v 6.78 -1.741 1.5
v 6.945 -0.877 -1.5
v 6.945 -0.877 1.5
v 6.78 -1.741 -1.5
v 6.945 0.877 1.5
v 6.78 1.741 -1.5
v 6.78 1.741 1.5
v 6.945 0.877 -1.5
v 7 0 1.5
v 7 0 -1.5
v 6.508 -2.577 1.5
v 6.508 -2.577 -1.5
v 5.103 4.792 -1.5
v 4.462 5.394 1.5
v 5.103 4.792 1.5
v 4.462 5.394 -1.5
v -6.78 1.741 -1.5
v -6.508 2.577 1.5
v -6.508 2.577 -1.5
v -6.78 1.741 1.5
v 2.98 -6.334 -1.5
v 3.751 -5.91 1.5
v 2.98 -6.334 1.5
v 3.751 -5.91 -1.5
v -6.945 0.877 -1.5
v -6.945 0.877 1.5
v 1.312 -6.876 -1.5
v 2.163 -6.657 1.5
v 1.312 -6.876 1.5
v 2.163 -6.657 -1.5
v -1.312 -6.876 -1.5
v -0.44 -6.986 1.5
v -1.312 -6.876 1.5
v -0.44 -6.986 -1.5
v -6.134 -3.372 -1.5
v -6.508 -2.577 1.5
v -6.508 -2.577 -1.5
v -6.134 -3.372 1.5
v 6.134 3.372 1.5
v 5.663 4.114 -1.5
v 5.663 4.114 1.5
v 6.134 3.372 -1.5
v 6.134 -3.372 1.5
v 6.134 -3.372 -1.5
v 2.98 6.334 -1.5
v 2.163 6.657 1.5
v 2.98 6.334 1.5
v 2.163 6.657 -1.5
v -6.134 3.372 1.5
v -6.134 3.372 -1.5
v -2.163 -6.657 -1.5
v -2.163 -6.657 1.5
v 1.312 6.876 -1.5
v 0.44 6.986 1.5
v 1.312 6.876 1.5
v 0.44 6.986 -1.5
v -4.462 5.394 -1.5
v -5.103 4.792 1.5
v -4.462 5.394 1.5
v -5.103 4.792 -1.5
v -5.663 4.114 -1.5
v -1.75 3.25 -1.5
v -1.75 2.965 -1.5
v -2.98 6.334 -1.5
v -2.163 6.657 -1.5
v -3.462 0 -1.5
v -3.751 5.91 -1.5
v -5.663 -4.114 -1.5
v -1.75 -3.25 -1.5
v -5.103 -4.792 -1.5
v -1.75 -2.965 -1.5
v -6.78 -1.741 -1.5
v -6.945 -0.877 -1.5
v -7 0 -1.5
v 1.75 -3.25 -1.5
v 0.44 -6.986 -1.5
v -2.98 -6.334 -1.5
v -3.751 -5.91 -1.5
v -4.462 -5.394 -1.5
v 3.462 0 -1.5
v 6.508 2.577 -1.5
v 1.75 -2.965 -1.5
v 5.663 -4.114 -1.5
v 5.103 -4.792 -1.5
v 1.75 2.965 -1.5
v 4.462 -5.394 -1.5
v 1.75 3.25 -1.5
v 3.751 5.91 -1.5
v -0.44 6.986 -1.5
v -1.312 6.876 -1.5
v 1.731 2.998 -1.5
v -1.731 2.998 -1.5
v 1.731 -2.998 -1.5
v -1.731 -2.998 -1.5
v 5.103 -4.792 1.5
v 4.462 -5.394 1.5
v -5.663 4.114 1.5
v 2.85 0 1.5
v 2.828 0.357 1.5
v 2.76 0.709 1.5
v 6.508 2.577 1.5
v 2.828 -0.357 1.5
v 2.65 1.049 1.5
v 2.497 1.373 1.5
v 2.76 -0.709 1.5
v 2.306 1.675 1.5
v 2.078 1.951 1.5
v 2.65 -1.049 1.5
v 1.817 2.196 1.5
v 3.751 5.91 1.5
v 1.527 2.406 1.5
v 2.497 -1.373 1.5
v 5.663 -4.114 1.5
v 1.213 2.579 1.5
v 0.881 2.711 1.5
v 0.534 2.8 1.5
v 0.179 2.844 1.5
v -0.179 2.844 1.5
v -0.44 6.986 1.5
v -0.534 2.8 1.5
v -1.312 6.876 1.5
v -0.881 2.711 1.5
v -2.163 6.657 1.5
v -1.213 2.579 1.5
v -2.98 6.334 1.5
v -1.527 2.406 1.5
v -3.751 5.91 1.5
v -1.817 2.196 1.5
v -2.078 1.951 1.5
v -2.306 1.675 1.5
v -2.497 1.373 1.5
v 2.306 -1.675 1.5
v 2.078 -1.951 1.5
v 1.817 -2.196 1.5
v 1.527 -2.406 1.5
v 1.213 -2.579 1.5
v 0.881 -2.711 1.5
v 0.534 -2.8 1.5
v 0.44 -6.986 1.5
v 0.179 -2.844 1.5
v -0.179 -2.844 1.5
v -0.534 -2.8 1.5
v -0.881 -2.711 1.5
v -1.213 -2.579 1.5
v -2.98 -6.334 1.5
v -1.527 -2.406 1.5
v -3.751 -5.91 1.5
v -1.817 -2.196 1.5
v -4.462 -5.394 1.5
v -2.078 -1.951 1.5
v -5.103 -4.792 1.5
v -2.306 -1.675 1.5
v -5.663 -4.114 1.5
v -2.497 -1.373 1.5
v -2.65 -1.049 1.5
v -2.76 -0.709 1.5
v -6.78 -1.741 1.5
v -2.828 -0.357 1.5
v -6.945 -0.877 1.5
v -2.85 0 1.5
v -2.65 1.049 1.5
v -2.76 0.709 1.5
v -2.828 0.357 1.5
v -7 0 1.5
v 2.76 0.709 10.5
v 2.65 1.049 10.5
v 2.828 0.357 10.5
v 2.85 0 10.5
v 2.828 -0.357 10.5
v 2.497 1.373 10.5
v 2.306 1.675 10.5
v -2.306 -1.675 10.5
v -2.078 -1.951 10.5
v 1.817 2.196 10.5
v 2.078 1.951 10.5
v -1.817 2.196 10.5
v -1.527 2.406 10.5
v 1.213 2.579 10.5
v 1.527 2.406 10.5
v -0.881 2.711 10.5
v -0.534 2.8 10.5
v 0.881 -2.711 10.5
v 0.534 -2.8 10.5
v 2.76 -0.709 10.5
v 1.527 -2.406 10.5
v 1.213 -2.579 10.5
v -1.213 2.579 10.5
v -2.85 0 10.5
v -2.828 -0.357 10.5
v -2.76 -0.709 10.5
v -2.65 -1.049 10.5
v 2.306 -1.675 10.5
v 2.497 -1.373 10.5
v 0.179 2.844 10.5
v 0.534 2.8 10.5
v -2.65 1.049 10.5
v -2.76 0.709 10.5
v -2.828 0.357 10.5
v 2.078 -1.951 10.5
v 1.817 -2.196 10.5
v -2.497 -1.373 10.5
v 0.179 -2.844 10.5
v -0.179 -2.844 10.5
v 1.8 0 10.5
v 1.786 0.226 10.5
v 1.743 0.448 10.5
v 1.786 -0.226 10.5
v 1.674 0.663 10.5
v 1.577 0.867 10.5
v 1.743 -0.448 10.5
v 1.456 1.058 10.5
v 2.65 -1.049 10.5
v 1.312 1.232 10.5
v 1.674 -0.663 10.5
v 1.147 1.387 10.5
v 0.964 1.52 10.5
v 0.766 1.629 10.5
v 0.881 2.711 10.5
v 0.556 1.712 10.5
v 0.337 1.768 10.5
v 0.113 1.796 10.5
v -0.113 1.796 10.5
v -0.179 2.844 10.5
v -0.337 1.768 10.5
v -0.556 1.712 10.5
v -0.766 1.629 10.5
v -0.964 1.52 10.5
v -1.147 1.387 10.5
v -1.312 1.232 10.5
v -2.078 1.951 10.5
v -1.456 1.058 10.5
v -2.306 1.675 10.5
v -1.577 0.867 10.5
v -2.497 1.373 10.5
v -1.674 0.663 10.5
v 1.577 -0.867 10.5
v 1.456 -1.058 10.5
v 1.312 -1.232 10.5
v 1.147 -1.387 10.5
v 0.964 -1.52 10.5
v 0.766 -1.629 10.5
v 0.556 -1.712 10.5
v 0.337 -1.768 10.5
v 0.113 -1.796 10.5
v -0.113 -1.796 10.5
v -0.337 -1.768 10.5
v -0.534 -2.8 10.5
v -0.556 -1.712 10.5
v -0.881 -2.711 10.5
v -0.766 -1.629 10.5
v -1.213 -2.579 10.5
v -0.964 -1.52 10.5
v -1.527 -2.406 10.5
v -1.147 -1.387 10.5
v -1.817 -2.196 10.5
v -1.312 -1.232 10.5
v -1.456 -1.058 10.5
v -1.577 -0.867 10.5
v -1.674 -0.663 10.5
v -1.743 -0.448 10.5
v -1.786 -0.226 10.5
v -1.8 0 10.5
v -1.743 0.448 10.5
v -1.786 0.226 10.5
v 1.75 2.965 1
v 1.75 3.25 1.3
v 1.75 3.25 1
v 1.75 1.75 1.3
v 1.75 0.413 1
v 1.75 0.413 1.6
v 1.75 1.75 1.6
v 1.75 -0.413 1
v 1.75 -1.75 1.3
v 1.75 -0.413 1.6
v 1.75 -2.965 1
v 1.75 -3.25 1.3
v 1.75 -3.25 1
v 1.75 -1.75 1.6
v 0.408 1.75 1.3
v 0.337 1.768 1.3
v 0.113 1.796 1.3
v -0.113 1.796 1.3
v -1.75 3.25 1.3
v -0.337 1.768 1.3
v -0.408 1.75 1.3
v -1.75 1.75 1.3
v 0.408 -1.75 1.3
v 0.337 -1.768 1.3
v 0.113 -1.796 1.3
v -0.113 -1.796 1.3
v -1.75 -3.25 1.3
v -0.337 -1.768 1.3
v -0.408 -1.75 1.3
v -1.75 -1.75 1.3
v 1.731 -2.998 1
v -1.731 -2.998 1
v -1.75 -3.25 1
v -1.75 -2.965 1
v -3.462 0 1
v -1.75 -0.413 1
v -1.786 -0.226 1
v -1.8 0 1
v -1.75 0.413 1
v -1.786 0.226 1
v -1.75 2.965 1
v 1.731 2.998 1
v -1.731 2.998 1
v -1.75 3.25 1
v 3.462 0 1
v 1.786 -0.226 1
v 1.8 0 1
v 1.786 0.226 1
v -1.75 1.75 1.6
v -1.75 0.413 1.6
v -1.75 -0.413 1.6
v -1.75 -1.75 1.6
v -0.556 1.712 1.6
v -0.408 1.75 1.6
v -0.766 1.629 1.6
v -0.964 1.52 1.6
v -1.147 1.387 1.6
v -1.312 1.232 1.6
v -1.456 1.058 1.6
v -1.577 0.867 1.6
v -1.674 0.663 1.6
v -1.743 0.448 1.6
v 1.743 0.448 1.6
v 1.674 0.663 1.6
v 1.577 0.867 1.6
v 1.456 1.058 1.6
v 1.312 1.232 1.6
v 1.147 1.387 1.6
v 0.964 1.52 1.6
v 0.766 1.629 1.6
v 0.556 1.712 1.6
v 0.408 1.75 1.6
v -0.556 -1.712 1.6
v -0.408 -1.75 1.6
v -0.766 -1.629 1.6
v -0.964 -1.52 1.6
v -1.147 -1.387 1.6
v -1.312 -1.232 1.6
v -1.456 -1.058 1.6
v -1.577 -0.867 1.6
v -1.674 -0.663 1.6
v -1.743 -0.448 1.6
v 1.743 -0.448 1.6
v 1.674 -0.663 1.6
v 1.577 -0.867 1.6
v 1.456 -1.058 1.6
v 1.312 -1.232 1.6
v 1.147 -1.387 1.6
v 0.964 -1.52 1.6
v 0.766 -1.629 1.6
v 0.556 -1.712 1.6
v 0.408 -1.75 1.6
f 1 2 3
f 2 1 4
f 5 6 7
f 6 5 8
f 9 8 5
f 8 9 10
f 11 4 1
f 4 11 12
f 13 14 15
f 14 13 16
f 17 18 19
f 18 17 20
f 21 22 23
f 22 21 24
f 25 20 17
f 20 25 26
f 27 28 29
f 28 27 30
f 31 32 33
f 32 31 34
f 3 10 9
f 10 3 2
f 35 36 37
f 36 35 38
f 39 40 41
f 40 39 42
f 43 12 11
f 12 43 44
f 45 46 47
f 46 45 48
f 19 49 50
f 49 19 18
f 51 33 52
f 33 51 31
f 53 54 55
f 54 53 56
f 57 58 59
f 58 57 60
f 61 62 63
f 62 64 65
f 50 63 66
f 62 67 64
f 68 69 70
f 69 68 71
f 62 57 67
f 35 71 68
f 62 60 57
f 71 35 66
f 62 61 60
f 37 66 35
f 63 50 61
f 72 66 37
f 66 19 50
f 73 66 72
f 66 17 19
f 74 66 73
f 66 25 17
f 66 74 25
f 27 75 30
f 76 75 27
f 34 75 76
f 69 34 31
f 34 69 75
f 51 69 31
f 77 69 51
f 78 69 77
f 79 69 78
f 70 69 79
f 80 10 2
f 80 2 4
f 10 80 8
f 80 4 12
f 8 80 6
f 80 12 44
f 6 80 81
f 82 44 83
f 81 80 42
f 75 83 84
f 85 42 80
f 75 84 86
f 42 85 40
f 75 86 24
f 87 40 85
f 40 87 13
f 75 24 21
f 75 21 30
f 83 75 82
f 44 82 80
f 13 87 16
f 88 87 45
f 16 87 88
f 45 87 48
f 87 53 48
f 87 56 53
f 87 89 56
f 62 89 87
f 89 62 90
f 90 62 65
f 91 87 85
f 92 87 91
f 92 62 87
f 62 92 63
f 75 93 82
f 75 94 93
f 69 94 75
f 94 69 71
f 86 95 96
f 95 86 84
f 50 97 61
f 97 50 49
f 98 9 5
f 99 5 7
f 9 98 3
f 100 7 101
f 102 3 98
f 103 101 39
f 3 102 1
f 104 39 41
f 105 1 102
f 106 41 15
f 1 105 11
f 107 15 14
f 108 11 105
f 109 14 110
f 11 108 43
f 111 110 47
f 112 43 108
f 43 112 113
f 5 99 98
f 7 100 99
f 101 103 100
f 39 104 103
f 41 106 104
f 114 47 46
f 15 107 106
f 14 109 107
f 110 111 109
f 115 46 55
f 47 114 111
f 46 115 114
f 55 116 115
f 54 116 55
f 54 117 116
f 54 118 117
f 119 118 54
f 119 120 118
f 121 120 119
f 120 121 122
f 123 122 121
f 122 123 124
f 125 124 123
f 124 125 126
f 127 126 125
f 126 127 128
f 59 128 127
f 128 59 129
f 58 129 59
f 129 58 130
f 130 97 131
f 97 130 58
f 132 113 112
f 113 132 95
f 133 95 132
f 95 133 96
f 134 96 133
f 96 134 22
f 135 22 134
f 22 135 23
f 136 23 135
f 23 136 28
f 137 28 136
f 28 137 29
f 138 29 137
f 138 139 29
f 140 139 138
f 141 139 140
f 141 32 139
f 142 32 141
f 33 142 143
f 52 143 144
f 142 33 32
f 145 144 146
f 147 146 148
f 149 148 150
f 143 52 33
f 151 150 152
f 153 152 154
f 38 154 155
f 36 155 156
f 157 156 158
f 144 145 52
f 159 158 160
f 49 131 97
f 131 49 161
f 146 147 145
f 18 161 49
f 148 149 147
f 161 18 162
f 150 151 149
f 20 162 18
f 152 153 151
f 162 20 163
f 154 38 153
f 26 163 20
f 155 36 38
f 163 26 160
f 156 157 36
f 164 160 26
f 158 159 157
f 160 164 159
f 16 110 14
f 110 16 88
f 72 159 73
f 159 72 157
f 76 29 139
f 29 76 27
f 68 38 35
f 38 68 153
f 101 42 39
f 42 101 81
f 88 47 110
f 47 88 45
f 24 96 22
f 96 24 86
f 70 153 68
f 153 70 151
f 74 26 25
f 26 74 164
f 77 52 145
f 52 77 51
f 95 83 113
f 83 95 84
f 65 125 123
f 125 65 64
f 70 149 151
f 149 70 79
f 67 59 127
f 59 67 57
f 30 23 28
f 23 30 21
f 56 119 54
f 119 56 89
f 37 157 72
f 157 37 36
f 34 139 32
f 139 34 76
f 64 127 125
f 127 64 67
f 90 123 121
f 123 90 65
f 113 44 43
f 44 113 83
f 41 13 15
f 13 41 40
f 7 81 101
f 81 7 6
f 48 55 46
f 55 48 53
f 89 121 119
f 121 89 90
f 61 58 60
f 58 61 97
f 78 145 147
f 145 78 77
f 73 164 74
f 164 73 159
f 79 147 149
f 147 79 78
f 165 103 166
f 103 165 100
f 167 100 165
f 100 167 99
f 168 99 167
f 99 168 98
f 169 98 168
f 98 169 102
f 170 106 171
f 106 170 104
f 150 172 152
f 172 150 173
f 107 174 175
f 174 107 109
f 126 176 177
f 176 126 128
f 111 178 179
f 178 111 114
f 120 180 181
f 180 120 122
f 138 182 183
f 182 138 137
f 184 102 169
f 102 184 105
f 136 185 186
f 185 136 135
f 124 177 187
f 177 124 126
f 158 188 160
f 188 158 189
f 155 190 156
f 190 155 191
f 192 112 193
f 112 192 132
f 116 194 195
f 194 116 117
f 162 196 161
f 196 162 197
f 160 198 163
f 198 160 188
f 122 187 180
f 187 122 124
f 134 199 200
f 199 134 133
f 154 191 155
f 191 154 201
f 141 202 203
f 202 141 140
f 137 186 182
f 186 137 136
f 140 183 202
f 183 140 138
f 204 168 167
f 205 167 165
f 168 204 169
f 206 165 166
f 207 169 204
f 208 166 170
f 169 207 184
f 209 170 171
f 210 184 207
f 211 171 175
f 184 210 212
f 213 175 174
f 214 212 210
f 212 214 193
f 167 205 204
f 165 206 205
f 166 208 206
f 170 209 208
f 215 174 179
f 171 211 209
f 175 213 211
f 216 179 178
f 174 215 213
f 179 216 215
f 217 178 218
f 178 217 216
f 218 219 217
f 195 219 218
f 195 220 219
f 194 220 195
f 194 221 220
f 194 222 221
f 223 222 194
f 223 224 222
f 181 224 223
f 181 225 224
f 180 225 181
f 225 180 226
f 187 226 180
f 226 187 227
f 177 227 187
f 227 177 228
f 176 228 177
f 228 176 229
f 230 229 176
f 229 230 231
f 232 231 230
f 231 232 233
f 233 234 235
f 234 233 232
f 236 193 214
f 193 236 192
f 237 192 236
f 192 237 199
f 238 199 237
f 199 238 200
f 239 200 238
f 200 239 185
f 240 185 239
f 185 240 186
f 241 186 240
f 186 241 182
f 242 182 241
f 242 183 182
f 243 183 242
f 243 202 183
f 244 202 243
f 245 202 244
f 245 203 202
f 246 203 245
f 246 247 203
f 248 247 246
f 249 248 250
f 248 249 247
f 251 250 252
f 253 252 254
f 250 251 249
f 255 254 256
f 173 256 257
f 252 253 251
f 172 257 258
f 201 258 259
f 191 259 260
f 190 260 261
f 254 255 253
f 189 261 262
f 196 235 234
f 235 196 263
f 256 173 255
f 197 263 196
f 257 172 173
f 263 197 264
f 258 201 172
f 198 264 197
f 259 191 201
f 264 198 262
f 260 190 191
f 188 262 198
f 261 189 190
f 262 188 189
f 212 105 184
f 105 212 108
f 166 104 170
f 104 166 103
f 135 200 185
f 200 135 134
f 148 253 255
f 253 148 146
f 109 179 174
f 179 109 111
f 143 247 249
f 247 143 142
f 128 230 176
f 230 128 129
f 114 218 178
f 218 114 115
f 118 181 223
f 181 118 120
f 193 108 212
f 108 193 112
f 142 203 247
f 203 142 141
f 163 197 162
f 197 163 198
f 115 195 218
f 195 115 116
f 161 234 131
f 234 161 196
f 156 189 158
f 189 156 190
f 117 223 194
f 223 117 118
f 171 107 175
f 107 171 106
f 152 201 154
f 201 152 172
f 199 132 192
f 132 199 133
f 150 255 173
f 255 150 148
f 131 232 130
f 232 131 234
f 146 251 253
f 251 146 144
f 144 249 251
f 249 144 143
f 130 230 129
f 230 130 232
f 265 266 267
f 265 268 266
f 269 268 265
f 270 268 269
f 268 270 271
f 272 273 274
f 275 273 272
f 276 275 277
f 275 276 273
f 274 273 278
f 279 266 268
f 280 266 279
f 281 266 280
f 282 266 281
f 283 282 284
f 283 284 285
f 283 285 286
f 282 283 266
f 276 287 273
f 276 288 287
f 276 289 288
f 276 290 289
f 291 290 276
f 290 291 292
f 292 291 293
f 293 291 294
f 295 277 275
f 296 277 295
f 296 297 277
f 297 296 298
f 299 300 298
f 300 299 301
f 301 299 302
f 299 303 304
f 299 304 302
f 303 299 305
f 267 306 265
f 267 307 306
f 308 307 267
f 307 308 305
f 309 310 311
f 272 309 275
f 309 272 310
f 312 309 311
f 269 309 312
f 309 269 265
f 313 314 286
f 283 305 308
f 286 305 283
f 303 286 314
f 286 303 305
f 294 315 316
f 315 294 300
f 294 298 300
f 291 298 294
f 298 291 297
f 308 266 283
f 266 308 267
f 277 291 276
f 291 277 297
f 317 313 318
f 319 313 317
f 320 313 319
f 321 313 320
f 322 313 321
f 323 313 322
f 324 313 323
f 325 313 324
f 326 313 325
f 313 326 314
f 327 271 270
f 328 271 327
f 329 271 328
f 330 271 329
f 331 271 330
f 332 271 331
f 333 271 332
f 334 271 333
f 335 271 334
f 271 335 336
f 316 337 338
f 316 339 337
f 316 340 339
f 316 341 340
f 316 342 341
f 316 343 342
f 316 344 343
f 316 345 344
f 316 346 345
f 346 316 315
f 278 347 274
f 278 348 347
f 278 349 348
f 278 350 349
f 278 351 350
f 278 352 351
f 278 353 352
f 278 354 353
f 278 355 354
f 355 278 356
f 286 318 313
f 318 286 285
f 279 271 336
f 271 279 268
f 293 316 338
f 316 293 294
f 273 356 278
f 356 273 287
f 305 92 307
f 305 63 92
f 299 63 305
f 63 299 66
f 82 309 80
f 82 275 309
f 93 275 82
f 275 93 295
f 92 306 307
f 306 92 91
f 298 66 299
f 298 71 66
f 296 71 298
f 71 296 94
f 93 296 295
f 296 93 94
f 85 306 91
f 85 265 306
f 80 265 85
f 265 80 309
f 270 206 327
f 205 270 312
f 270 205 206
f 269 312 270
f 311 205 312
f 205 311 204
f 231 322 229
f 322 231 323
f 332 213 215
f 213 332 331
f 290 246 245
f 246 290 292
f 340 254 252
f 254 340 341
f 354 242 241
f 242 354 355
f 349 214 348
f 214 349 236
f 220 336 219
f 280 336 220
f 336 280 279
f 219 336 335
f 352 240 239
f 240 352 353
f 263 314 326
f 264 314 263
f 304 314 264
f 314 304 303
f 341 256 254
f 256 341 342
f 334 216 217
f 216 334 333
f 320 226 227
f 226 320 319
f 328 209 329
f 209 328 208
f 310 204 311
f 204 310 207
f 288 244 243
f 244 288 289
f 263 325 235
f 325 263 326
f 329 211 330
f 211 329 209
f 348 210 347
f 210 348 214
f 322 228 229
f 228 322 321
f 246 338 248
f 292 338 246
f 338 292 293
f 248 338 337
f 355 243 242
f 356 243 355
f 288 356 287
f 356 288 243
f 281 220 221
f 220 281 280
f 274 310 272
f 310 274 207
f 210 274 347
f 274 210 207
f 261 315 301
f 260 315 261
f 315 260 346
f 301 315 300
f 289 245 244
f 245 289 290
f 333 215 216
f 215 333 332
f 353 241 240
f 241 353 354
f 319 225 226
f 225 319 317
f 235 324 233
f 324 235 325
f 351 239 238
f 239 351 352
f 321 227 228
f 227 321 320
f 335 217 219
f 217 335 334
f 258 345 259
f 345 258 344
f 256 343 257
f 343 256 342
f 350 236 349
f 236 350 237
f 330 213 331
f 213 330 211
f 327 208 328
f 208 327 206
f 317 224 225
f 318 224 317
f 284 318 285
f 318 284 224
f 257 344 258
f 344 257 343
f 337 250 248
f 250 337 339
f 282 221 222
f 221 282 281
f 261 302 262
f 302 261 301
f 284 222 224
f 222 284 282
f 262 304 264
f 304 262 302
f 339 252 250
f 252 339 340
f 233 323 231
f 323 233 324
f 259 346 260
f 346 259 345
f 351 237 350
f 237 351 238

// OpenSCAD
$fn = 50;


difference() {
	union() {
		translate(v = [0, 0, -1.5000000000]) {
			cylinder(h = 3, r = 7.0000000000);
		}
		translate(v = [0, 0, -1.5000000000]) {
			cylinder(h = 12, r = 2.8500000000);
		}
	}
	union() {
		translate(v = [0, 0, -1.5000000000]) {
			rotate(a = [0, 0, 0]) {
				difference() {
					union() {
						translate(v = [-1.7500000000, -3.2500000000, -0.3000000000]) {
							cube(size = [3.5000000000, 6.5000000000, 0.3000000000]);
						}
						translate(v = [-1.7500000000, -1.7500000000, -0.6000000000]) {
							cube(size = [3.5000000000, 3.5000000000, 0.3000000000]);
						}
						translate(v = [-1.7500000000, -3.2500000000, 2.5000000000]) {
							cube(size = [3.5000000000, 6.5000000000, 0.3000000000]);
						}
						translate(v = [-1.7500000000, -1.7500000000, 2.8000000000]) {
							cube(size = [3.5000000000, 3.5000000000, 0.3000000000]);
						}
						linear_extrude(height = 2.5000000000) {
							polygon(points = [[3.4620000000, 0.0000000000], [1.7310000000, 2.9981799479], [-1.7310000000, 2.9981799479], [-3.4620000000, 0.0000000000], [-1.7310000000, -2.9981799479], [1.7310000000, -2.9981799479]]);
						}
						translate(v = [-1.7500000000, -3.2500000000, -0.3000000000]) {
							cube(size = [3.5000000000, 6.5000000000, 0.3000000000]);
						}
						translate(v = [-1.7500000000, -1.7500000000, -0.6000000000]) {
							cube(size = [3.5000000000, 3.5000000000, 0.3000000000]);
						}
						translate(v = [-1.7500000000, -3.2500000000, 2.5000000000]) {
							cube(size = [3.5000000000, 6.5000000000, 0.3000000000]);
						}
						translate(v = [-1.7500000000, -1.7500000000, 2.8000000000]) {
							cube(size = [3.5000000000, 3.5000000000, 0.3000000000]);
						}
						translate(v = [-1.7500000000, -3.2500000000, -0.3000000000]) {
							cube(size = [3.5000000000, 6.5000000000, 0.3000000000]);
						}
						translate(v = [-1.7500000000, -1.7500000000, -0.6000000000]) {
							cube(size = [3.5000000000, 3.5000000000, 0.3000000000]);
						}
						translate(v = [-1.7500000000, -3.2500000000, 2.5000000000]) {
							cube(size = [3.5000000000, 6.5000000000, 0.3000000000]);
						}
						translate(v = [-1.7500000000, -1.7500000000, 2.8000000000]) {
							cube(size = [3.5000000000, 3.5000000000, 0.3000000000]);
						}
					}
					union();
				}
			}
		}
		translate(v = [0, 0, -100.0000000000]) {
			cylinder(h = 200, r = 1.8000000000);
		}
	}
}
